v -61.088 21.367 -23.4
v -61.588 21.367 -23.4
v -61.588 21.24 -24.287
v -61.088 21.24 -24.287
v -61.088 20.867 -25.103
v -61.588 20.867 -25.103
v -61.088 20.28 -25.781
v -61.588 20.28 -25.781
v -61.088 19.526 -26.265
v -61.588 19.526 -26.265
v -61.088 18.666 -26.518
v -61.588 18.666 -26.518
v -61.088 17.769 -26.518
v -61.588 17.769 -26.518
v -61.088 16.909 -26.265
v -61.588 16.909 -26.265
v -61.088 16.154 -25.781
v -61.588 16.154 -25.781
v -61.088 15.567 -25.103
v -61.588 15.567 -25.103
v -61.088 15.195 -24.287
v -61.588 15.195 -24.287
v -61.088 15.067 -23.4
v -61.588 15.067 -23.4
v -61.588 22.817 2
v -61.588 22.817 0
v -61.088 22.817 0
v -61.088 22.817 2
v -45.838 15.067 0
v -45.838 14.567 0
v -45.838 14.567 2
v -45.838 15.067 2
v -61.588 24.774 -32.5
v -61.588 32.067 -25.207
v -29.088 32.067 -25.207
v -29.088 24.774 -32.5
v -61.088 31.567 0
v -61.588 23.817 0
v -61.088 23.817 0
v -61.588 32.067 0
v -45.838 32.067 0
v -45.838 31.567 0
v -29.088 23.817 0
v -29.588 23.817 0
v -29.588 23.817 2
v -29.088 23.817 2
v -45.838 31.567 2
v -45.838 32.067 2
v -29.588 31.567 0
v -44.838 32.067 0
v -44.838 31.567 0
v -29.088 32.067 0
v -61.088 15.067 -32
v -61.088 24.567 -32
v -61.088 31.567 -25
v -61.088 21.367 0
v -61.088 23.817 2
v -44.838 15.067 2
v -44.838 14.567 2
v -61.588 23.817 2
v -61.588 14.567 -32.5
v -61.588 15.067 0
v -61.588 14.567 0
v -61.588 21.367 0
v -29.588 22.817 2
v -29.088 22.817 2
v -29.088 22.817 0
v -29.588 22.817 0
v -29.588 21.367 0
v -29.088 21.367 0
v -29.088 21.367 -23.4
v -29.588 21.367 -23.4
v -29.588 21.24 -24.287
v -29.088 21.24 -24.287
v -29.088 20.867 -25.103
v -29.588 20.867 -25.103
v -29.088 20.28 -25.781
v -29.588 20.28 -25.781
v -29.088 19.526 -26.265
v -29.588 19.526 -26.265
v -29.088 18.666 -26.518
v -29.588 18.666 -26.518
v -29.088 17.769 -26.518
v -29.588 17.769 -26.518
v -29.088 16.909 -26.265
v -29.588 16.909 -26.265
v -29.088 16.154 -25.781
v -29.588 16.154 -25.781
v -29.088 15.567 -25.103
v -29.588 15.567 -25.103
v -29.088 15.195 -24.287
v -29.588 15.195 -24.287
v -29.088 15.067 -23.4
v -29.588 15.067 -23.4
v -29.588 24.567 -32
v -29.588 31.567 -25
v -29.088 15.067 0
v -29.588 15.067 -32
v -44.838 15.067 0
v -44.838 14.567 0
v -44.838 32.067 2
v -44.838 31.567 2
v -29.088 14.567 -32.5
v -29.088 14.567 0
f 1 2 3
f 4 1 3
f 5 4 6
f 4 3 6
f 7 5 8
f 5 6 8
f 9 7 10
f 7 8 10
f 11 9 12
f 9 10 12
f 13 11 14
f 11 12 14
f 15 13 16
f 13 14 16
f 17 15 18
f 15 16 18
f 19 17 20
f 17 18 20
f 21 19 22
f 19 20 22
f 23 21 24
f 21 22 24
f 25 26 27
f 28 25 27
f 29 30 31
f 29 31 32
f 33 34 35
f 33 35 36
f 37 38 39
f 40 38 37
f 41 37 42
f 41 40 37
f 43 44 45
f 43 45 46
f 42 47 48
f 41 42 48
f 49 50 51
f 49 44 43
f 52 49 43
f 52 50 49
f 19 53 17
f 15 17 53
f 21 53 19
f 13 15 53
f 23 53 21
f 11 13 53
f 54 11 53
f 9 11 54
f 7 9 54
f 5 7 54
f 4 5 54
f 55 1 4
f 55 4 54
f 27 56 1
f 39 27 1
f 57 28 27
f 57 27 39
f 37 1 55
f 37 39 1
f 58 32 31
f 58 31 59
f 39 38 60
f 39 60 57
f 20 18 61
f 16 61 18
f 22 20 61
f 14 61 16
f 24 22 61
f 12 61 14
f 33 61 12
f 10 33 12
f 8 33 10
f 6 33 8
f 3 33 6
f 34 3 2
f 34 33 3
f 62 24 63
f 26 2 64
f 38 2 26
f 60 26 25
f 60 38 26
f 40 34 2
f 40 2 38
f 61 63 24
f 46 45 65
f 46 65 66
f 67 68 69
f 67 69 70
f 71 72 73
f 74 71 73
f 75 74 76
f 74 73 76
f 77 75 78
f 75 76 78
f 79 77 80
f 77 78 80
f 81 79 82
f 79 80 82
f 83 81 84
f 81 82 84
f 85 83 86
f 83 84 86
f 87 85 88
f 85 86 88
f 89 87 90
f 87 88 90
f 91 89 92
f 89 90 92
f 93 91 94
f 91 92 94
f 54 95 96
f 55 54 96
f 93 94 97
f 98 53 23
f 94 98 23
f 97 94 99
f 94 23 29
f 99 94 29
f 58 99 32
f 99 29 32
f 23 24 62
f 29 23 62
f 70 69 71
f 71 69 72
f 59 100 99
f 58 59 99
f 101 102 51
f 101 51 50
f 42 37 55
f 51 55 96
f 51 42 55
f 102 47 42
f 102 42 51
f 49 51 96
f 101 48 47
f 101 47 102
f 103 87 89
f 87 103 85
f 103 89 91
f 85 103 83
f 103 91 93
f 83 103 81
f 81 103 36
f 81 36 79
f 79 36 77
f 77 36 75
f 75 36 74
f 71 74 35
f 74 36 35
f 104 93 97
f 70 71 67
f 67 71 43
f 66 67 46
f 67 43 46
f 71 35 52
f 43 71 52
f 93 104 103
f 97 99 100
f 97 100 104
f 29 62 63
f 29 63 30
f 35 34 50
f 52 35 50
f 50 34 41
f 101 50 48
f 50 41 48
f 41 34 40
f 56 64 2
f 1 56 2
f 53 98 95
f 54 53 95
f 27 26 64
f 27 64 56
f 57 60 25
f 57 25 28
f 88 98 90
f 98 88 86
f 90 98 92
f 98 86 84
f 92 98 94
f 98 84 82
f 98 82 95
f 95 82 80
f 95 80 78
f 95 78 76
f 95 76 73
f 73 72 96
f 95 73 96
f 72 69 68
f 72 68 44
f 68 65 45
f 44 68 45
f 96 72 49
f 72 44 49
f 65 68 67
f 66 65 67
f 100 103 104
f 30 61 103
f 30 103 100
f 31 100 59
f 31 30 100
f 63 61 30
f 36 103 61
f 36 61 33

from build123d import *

# Parameters (mm, degrees)
ESQUISSE1_W             = 32.5
ESQUISSE1_H             = 17.5
ESQUISSE1_W_2           = 31.5
ESQUISSE1_H_2           = 16.5
BASE_EXTRUSION_DEPTH    = 32
ESQUISSE3_W             = 0.5
ESQUISSE3_H             = 17.5
BOSS_EXTRU_1_DEPTH      = 32.5
ENL_V_MAT_EXTRU_1_DEPTH = 57.042915794
ESQUISSE5_W             = 1
ESQUISSE5_H             = 0.5
ESQUISSE5_W_2           = 0.5
ESQUISSE5_H_2           = 1
BOSS_EXTRU_2_DEPTH      = 2
ENL_V_MAT_EXTRU_2_DEPTH = 35.693670075
EXTRUSION2_DEPTH        = 32.5


with BuildPart() as part:
    # Esquisse1 → Base-Extrusion (new body)
    with BuildSketch(Plane.XY):
        with Locations((-45.33773679, 23.317248255)):
            Rectangle(ESQUISSE1_W, ESQUISSE1_H)
        with Locations((-45.33773679, 23.317248255)):
            Rectangle(ESQUISSE1_W_2, ESQUISSE1_H_2, mode=Mode.SUBTRACT)
    extrude(amount=-BASE_EXTRUSION_DEPTH)

    # Esquisse3 → Boss.-Extru.1 (add)
    with BuildSketch(Plane.ZY.offset(61.58773679)):
        with Locations((-32.25, 23.317248255)):
            Rectangle(ESQUISSE3_W, ESQUISSE3_H)
    extrude(amount=-BOSS_EXTRU_1_DEPTH)

    # Esquisse4 → Enlèv. mat.-Extru.1 (cut, through all)
    with BuildSketch(Plane.ZY.offset(61.58773679)):
        with BuildLine():
            Line((-23.4, 15.067248255), (0.817293984, 15.067248255))
            Line((0.817293984, 15.067248255), (0.817293984, 21.367248255))
            Line((0.817293984, 21.367248255), (-23.4, 21.367248255))
            ThreePointArc((-23.4, 21.367248255), (-26.55, 18.217248255), (-23.4, 15.067248255))
        make_face()
    extrude(amount=-ENL_V_MAT_EXTRU_1_DEPTH, mode=Mode.SUBTRACT)

    # Esquisse5 → Boss.-Extru.2 (add)
    with BuildSketch(Plane.XY):
        with Locations((-45.33773679, 14.817248255)):
            Rectangle(ESQUISSE5_W, ESQUISSE5_H)
        with Locations((-29.33773679, 23.317248255)):
            Rectangle(ESQUISSE5_W_2, ESQUISSE5_H_2)
        with Locations((-45.33773679, 31.817248255)):
            Rectangle(ESQUISSE5_W, ESQUISSE5_H)
        with Locations((-61.33773679, 23.317248255)):
            Rectangle(ESQUISSE5_W_2, ESQUISSE5_H_2)
    extrude(amount=BOSS_EXTRU_2_DEPTH)

    # Esquisse6 → Enlèv. mat.-Extru.2 (cut)
    with BuildSketch(Plane.ZY.offset(61.58773679)):
        Polygon((-41.526935662, 26.437225615), (-29.203507462, 38.760653816), (-23.505050951, 33.062197305), (-35.828479151, 20.738769104), align=None)
    extrude(amount=-ENL_V_MAT_EXTRU_2_DEPTH, mode=Mode.SUBTRACT)

    # Esquisse7 → Extrusion2 (add)
    with BuildSketch(Plane.ZY.offset(61.58773679)):
        Polygon((-32.5, 24.067248255), (-24.5, 32.067248255), (-25.207106781, 32.067248255), (-32.5, 24.774355036), align=None)
    extrude(amount=-EXTRUSION2_DEPTH)


solid = part.part
